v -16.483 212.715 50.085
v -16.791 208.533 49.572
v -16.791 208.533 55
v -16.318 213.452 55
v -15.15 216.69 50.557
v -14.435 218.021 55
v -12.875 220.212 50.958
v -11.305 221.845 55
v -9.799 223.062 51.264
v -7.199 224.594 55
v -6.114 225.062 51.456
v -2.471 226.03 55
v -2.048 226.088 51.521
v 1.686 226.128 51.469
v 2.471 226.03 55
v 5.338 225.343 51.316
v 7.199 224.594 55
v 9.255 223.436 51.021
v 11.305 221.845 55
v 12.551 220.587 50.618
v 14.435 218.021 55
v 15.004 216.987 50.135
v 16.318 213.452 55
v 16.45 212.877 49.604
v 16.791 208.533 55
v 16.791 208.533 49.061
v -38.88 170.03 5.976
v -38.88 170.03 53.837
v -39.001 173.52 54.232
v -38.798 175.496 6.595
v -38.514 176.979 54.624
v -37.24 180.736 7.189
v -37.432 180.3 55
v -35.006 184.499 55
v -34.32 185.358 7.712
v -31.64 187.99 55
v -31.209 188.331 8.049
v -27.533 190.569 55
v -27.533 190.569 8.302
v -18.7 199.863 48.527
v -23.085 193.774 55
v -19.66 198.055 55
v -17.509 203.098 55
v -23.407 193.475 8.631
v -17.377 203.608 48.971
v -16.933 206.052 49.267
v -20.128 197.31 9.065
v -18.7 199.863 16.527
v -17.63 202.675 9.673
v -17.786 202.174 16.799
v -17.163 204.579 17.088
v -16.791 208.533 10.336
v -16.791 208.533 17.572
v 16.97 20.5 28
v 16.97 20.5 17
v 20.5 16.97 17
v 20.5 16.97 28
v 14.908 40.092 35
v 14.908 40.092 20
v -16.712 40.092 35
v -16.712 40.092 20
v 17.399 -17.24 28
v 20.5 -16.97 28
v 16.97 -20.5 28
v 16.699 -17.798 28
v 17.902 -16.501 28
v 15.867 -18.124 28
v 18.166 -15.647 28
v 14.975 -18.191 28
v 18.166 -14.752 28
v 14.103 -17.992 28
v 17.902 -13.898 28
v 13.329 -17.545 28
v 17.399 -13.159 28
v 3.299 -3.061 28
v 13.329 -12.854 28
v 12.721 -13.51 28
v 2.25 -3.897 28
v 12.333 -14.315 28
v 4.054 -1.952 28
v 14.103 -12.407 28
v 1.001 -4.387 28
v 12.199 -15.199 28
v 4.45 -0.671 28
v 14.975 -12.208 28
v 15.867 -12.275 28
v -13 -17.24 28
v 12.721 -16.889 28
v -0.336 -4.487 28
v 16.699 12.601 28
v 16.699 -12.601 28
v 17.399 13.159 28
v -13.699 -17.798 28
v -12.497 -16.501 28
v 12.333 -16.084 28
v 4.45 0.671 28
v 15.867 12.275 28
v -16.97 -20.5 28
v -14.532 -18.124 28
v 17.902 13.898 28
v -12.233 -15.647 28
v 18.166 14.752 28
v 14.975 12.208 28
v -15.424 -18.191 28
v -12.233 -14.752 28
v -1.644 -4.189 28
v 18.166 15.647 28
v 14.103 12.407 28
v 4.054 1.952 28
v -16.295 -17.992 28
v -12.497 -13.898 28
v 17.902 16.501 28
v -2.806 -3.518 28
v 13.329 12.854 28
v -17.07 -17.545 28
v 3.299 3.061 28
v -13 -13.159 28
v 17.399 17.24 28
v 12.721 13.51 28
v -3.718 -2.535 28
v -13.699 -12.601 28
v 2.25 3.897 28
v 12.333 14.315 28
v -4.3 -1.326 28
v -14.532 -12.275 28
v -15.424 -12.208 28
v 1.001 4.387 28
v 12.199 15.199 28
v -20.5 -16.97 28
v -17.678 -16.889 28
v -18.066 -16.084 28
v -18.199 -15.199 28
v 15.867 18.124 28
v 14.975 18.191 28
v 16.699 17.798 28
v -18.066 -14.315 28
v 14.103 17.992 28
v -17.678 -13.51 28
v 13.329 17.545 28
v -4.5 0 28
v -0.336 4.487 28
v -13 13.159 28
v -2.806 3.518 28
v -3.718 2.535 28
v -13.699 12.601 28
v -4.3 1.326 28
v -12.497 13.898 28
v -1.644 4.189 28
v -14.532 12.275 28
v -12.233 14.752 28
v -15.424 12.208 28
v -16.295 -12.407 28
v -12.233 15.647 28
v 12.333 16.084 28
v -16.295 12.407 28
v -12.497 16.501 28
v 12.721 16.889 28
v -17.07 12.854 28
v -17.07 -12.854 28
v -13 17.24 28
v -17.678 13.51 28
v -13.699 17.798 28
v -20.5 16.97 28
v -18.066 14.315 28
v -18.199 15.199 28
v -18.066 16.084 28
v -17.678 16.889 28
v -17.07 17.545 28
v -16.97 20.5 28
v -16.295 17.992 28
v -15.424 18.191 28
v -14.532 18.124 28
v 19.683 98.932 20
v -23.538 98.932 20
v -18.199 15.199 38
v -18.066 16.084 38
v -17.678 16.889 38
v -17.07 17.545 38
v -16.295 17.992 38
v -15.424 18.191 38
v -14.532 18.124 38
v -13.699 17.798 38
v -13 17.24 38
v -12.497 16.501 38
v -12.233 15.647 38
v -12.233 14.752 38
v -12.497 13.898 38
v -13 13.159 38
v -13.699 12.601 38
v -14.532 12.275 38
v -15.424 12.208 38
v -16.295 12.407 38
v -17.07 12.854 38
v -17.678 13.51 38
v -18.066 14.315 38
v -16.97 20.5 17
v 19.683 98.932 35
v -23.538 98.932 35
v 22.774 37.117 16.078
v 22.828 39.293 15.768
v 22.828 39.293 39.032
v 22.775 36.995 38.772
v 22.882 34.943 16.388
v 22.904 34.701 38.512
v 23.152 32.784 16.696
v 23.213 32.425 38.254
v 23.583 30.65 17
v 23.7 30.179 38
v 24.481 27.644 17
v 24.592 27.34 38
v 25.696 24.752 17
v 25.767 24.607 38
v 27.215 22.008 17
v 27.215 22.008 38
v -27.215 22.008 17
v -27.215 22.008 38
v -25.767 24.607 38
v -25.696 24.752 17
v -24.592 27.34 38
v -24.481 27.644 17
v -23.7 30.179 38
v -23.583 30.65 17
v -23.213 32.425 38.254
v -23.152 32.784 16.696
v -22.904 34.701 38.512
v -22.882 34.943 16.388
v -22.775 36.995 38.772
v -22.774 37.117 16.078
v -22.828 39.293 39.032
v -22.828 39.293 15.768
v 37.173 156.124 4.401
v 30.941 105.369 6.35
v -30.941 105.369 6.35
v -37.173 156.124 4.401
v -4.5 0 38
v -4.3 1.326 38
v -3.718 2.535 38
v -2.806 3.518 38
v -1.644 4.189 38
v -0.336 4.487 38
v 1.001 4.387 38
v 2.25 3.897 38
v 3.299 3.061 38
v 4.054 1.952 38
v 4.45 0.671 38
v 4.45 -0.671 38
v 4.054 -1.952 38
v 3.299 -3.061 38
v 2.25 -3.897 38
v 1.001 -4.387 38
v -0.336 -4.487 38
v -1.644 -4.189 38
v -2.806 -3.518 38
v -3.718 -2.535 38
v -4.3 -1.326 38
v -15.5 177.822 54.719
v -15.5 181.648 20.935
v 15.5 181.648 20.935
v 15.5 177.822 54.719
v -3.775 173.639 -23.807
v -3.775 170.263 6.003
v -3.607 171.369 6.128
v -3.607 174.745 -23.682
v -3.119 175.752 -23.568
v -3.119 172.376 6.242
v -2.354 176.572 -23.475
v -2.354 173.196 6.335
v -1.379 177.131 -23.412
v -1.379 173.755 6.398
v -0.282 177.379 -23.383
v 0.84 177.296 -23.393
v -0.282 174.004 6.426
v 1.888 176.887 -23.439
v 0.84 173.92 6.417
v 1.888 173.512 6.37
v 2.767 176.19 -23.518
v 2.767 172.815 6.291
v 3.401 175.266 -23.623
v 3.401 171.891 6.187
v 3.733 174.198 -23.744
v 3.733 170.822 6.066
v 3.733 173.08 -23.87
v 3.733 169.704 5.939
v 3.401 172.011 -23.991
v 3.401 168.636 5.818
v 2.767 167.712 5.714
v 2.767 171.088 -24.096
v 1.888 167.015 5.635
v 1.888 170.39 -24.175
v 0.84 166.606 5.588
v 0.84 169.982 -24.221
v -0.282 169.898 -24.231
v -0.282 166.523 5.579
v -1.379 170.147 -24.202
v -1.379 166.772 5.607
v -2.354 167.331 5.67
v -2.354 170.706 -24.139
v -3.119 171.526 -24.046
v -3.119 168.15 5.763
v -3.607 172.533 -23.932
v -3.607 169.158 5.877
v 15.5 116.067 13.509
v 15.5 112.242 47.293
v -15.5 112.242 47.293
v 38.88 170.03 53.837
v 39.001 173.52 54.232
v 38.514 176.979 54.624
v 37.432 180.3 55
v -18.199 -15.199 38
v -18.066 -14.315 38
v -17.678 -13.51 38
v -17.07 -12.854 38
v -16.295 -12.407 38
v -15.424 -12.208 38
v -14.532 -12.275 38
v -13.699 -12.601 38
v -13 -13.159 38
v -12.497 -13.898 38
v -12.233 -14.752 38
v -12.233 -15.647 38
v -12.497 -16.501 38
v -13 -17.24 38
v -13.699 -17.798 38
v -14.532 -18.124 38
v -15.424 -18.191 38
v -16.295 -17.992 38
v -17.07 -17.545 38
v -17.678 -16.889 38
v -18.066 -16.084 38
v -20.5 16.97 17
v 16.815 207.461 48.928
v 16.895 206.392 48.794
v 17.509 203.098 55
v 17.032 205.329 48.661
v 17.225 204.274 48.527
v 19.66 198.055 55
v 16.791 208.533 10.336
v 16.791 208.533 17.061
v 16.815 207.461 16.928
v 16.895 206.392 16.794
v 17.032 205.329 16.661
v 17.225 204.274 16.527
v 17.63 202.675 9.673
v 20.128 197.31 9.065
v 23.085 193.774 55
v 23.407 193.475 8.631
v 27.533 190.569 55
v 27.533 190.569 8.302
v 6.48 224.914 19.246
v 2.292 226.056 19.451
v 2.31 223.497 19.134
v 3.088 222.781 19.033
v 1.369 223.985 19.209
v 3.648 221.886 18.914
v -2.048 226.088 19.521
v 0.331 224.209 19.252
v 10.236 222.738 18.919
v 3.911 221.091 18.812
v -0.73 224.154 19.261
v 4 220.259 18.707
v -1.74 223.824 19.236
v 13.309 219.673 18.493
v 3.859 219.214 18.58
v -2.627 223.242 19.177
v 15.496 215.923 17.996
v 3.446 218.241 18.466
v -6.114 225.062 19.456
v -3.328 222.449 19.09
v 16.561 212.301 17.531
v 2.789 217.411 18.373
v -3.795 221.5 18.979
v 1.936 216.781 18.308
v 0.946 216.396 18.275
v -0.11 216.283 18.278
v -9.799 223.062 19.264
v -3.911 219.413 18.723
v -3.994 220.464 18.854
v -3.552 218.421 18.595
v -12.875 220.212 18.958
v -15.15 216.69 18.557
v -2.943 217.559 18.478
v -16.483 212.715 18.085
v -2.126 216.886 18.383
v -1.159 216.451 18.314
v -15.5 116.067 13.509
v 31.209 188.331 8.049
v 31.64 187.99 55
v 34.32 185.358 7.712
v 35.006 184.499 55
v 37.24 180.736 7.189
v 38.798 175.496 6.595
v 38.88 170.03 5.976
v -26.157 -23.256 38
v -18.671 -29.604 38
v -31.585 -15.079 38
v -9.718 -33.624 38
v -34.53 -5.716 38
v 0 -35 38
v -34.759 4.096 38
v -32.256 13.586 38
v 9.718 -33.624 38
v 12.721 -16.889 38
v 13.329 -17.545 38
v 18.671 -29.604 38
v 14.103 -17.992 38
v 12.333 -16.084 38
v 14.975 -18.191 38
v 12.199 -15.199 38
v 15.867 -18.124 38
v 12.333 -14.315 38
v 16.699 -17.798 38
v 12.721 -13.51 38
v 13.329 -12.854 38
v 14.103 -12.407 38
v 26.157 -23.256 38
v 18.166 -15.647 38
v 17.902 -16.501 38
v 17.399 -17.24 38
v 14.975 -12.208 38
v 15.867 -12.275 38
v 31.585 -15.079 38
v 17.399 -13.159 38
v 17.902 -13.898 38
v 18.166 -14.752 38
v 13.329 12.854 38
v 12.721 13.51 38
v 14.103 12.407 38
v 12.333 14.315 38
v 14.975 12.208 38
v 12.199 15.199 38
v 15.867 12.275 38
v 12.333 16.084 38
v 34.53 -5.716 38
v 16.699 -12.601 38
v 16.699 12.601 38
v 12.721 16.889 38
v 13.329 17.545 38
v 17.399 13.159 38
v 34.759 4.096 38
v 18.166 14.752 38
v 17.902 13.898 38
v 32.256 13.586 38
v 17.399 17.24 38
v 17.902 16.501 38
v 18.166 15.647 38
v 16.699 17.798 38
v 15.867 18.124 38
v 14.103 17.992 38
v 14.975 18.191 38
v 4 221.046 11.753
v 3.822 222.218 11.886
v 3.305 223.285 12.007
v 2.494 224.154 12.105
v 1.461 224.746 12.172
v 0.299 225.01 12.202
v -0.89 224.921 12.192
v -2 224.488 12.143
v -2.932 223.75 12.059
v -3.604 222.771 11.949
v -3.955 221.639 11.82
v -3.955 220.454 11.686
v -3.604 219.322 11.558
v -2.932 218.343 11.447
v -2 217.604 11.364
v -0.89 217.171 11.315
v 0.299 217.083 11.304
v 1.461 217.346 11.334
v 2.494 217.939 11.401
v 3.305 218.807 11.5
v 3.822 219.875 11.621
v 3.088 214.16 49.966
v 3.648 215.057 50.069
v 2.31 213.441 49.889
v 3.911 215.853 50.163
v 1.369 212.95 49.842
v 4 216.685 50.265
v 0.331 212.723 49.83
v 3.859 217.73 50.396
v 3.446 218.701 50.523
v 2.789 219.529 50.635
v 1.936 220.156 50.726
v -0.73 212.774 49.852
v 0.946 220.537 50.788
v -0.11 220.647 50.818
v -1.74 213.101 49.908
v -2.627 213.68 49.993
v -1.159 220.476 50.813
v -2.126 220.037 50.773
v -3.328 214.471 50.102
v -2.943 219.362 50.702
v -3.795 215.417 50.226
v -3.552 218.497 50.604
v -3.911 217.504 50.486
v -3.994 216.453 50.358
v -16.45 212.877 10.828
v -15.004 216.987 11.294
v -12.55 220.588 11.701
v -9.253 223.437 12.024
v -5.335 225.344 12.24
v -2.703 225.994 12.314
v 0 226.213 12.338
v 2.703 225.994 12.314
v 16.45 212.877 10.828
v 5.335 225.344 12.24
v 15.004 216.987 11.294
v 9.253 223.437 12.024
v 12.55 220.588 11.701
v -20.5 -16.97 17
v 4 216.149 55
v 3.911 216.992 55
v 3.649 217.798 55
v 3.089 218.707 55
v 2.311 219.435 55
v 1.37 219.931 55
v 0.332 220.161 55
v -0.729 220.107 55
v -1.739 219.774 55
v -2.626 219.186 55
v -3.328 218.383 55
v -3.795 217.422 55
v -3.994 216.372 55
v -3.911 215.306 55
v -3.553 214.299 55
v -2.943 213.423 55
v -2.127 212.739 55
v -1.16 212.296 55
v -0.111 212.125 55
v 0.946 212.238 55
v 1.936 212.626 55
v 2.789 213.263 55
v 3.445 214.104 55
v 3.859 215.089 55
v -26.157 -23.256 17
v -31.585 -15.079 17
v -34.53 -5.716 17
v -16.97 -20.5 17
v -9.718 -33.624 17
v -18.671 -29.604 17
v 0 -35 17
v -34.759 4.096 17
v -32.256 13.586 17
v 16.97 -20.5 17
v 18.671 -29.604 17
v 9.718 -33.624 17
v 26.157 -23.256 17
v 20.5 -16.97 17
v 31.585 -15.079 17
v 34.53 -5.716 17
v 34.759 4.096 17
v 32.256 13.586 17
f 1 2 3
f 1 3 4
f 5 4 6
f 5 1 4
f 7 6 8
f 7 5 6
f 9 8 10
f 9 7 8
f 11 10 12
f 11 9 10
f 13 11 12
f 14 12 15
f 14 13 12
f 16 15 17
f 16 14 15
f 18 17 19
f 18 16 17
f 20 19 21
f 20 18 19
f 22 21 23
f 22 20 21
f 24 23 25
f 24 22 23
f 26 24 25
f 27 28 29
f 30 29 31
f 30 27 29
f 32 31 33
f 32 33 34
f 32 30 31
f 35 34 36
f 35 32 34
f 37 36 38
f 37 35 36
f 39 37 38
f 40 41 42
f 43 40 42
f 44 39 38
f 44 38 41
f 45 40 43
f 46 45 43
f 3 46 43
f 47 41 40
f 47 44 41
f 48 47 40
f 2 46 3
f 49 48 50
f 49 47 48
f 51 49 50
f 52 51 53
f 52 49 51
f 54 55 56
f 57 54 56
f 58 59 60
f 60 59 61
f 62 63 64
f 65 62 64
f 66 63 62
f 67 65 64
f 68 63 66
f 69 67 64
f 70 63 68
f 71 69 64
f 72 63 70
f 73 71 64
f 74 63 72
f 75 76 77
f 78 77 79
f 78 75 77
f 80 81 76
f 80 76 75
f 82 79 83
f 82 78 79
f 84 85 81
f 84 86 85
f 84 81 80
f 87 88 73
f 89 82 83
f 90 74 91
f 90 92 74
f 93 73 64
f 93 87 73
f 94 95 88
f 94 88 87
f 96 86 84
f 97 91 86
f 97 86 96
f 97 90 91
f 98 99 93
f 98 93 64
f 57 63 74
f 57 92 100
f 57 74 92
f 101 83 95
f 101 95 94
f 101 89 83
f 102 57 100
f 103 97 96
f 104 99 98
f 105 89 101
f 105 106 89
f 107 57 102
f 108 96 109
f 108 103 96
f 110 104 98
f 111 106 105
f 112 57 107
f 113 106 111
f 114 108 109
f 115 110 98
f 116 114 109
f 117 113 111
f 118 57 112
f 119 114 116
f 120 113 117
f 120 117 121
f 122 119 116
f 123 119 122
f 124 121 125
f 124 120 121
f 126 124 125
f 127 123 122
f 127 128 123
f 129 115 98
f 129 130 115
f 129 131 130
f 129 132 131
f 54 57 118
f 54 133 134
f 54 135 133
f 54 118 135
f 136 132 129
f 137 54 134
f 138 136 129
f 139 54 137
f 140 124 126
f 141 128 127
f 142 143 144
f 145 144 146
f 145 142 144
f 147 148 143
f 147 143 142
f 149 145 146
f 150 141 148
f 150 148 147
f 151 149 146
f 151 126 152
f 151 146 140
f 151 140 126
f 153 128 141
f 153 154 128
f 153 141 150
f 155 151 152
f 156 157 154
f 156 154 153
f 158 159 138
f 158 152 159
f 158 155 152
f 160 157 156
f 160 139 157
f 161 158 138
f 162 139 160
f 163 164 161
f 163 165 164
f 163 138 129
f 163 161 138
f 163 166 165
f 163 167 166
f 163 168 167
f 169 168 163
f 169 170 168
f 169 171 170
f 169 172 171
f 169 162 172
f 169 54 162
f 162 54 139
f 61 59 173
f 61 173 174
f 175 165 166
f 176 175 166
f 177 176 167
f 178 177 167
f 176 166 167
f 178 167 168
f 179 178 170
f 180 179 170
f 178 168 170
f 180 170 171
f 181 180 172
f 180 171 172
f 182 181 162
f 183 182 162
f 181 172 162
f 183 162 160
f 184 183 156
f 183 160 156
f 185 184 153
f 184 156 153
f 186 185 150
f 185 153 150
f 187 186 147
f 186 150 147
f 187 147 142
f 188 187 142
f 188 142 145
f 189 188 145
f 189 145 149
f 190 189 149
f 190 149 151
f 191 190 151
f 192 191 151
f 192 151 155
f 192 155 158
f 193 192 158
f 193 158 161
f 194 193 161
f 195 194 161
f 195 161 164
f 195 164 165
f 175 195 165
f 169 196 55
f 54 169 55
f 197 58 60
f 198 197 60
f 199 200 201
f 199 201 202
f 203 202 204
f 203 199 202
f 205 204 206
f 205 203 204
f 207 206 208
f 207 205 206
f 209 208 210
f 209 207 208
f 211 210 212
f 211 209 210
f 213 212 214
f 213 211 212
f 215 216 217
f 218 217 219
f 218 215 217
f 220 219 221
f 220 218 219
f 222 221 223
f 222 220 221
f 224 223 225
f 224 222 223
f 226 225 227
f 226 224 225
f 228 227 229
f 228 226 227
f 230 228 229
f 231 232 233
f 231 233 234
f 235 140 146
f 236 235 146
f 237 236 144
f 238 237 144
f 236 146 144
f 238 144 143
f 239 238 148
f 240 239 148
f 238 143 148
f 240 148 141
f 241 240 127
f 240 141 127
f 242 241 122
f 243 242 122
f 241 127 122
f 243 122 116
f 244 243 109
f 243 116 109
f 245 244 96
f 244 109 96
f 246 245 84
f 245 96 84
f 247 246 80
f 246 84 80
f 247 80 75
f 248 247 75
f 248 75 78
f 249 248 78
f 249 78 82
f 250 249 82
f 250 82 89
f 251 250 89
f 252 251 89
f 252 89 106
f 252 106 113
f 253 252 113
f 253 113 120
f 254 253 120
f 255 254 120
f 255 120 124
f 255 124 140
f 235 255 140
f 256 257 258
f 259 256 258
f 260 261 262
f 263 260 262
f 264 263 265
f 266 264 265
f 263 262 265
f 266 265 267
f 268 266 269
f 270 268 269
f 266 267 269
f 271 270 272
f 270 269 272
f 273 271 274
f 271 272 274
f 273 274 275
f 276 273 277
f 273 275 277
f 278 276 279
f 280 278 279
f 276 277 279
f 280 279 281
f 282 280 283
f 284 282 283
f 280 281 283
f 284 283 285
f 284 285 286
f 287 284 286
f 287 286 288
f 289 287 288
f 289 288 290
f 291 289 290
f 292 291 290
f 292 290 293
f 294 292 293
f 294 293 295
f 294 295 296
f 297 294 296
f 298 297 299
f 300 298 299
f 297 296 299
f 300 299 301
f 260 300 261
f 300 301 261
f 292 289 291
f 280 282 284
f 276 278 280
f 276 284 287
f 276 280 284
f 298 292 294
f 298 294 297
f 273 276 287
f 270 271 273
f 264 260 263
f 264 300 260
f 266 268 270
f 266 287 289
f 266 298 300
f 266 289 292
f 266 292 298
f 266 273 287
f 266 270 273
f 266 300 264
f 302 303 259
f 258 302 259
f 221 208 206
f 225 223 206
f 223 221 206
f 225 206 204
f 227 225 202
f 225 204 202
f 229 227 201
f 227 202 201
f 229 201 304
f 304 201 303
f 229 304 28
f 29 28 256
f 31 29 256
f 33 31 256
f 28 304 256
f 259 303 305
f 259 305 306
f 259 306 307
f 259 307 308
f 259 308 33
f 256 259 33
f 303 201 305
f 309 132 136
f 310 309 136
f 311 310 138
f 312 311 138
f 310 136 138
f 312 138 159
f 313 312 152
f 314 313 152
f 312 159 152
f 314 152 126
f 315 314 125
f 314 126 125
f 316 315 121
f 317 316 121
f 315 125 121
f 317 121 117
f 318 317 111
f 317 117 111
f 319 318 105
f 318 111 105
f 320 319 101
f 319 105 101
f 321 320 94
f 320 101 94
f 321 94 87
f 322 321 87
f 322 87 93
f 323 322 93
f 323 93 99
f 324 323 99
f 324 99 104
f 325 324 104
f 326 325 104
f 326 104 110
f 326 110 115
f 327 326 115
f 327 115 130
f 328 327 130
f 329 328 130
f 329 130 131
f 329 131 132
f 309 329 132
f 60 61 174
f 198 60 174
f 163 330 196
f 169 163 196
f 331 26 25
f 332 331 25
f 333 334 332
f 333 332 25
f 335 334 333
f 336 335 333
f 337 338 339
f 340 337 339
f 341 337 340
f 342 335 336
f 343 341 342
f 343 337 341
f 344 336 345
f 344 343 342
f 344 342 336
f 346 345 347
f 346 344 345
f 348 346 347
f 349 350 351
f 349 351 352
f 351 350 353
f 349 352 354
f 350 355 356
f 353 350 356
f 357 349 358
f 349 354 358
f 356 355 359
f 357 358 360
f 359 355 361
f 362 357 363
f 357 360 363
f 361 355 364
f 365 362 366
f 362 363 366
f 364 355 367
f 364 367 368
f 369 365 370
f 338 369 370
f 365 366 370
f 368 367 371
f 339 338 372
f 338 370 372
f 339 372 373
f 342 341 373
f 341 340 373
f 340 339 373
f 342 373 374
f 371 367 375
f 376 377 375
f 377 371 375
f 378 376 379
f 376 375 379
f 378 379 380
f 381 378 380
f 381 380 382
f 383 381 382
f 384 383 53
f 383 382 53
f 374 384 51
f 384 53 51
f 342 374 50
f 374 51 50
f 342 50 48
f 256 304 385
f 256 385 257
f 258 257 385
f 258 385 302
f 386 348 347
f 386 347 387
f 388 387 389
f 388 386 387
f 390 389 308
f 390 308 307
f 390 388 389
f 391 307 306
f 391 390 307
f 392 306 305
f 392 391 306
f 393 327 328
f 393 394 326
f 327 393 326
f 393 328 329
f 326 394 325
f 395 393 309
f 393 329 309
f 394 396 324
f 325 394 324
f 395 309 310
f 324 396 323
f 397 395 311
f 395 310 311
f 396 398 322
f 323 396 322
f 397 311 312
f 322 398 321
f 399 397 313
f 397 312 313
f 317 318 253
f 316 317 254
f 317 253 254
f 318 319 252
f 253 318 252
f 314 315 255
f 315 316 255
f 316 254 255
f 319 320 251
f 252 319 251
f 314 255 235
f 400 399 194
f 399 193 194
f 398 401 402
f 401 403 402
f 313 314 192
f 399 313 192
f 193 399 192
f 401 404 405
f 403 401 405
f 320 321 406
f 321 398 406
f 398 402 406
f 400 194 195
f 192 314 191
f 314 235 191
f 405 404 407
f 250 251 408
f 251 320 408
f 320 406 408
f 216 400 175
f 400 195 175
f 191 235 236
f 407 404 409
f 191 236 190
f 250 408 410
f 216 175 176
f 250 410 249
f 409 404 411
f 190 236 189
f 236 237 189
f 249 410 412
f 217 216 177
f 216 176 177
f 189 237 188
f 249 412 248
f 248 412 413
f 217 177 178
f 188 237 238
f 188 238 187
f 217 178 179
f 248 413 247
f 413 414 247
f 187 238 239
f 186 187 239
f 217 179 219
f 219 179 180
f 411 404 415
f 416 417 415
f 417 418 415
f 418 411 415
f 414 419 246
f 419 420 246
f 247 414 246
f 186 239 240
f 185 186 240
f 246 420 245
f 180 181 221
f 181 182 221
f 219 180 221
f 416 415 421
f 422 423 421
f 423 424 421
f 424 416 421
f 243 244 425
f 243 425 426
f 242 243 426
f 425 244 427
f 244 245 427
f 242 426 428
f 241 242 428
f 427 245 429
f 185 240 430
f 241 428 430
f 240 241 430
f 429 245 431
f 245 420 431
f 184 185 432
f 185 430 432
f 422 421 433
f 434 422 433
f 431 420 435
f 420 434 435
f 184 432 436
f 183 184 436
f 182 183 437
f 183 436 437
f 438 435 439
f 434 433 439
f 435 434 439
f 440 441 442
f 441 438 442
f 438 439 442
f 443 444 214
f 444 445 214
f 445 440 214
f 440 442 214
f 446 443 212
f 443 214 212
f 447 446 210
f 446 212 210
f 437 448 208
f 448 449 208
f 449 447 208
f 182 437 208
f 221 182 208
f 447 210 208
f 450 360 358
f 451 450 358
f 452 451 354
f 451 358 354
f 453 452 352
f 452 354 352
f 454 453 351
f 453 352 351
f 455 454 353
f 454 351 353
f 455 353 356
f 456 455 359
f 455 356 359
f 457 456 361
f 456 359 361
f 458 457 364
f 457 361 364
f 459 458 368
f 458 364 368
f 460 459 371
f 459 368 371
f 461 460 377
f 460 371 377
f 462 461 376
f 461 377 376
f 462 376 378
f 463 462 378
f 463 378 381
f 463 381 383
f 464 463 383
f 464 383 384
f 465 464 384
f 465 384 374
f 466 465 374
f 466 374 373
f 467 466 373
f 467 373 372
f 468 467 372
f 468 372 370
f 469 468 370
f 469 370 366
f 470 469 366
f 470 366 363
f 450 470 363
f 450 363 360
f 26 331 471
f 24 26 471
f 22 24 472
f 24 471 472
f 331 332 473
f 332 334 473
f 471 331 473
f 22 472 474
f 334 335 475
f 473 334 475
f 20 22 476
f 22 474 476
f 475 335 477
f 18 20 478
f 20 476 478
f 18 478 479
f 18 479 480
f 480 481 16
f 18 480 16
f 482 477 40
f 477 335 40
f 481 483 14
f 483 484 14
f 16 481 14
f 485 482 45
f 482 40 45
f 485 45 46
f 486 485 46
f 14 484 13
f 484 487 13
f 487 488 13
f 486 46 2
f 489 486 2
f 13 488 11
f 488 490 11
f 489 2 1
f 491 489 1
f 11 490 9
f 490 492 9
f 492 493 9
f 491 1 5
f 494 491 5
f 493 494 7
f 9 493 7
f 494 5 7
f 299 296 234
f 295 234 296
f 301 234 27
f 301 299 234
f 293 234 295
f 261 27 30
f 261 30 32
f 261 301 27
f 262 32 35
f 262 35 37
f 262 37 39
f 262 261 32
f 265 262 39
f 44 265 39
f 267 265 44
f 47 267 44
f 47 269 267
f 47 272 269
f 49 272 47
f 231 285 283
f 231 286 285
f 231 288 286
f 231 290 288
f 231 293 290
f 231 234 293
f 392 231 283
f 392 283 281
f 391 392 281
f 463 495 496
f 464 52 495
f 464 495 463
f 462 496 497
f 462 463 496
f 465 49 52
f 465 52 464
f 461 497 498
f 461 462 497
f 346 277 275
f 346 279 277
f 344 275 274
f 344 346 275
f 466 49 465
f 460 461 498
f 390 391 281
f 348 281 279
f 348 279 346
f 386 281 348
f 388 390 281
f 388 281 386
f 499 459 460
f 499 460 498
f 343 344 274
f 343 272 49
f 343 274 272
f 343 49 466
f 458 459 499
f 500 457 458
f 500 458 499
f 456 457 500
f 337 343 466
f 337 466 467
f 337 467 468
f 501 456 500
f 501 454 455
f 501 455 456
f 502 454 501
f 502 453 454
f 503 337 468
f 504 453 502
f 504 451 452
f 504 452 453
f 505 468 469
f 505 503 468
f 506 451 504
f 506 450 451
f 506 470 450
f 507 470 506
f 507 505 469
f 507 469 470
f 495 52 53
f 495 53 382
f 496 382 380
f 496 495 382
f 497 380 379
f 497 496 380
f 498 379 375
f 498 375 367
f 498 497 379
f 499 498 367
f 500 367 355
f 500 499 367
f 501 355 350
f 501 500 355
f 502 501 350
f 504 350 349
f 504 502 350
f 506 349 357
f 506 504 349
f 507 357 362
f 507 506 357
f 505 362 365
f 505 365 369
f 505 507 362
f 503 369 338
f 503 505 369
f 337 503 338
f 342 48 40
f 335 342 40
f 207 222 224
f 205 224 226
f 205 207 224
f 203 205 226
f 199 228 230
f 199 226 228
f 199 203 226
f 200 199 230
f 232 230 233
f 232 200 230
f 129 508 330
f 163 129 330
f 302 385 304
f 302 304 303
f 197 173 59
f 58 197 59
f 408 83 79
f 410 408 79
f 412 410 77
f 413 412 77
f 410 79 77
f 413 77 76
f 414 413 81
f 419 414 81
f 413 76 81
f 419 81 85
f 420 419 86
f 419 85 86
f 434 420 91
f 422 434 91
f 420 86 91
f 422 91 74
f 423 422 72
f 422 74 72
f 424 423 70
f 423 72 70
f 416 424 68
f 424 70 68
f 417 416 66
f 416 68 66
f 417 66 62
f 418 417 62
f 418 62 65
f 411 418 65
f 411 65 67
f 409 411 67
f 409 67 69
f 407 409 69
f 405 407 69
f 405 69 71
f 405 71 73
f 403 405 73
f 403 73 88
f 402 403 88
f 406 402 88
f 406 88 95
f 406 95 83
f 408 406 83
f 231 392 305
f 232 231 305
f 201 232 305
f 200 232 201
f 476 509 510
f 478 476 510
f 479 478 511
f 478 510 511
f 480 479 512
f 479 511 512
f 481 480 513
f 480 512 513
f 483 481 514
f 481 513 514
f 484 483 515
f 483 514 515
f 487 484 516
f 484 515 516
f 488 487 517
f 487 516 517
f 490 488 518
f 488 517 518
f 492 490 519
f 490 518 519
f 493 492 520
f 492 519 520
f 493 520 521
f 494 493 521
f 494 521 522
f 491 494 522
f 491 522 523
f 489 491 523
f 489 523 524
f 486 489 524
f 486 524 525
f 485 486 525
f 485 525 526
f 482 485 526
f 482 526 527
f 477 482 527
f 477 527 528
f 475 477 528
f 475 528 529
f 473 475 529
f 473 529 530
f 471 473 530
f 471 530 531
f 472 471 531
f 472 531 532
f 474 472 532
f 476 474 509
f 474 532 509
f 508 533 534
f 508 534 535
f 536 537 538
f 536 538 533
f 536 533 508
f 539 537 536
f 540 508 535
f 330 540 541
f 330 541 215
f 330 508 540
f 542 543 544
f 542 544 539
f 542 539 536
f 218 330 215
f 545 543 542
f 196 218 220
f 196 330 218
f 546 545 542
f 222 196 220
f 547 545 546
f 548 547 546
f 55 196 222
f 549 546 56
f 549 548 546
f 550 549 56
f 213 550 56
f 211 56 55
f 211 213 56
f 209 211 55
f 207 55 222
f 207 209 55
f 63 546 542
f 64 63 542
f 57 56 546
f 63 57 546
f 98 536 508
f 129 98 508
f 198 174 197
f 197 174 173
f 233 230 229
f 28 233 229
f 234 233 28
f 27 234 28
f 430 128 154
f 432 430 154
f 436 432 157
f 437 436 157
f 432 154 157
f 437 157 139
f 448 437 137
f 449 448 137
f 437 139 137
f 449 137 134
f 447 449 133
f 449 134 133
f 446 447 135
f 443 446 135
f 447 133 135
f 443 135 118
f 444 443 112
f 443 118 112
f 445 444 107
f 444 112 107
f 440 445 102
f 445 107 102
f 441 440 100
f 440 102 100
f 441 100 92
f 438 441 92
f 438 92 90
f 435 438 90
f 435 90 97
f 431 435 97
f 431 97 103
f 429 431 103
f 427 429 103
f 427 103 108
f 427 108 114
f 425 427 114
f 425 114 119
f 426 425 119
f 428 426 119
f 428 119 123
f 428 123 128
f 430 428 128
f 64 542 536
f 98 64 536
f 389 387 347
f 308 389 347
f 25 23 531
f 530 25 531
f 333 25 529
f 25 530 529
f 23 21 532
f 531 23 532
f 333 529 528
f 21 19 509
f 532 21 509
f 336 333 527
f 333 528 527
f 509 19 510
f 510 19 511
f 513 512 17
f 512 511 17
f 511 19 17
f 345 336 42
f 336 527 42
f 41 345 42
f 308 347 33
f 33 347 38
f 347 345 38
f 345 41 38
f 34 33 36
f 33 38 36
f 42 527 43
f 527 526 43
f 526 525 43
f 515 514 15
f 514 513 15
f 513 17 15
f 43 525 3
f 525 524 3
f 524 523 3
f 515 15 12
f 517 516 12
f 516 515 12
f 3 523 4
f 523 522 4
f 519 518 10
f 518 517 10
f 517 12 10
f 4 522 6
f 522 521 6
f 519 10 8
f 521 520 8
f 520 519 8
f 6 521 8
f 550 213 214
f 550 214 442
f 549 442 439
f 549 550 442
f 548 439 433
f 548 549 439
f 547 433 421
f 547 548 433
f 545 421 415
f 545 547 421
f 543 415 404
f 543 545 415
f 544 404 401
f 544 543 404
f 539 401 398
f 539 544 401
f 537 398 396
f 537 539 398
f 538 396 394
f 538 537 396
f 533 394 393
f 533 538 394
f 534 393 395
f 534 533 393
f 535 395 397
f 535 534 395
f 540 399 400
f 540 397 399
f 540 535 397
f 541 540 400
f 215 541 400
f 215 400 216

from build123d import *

# Parameters (mm, degrees)
BOSS_EXTRUDE1_DEPTH     = 55
CUT_EXTRUDE3_DEPTH      = 28
CUT_EXTRUDE4_DEPTH      = 40.029131656
CUT_EXTRUDE4_DEPTH_BACK = 40.029131656
SKETCH18_R              = 4.5
SKETCH18_R_2            = 3
CUT_EXTRUDE5_DEPTH      = 24.598674983
CUT_EXTRUDE5_DEPTH_BACK = 28
CUT_EXTRUDE6_DEPTH      = 26.134831719
CUT_EXTRUDE6_DEPTH_BACK = 85.175442033
SKETCH21_R              = 4
CUT_EXTRUDE7_DEPTH      = 25.226187847
CUT_EXTRUDE7_DEPTH_BACK = 56.443633682
SKETCH22_W              = 31
SKETCH22_H              = 66
CUT_EXTRUDE8_DEPTH      = 34
SKETCH30_R              = 3.775
BOSS_EXTRUDE2_DEPTH     = 30
CUT_EXTRUDE9_START      = 20
CUT_EXTRUDE9_DEPTH      = 15


with BuildPart() as part:
    # Sketch1 → Boss-Extrude1 (new body)
    with BuildSketch(Plane.XY):
        with BuildLine():
            Line((-22.827528122, 39.292617223), (-38.880054689, 170.029954628))
            ThreePointArc((-38.880054689, 170.029954628), (-36.535345881, 182.138559801), (-27.533199801, 190.569297881))
            ThreePointArc((-27.533199801, 190.569297881), (-19.660174006, 198.055084384), (-16.79086128, 208.533088928))
            ThreePointArc((-16.79086128, 208.533088928), (0, 226.212902341), (16.79086128, 208.533088928))
            ThreePointArc((16.79086128, 208.533088928), (19.660174006, 198.055084384), (27.533199801, 190.569297881))
            ThreePointArc((27.533199801, 190.569297881), (36.535345881, 182.138559801), (38.880054689, 170.029954628))
            Line((38.880054689, 170.029954628), (22.827528122, 39.292617223))
            ThreePointArc((22.827528122, 39.292617223), (23.667809595, 30.306601974), (27.215074691, 22.007719318))
            ThreePointArc((27.215074691, 22.007719318), (0, -35), (-27.215074691, 22.007719318))
            ThreePointArc((-27.215074691, 22.007719318), (-23.667809595, 30.306601974), (-22.827528122, 39.292617223))
        make_face()
    extrude(amount=BOSS_EXTRUDE1_DEPTH)

    # Sketch5 → Cut-Extrude3 (cut)
    with BuildSketch(Plane.XY):
        Polygon((16.97, -20.5), (-16.97, -20.5), (-20.5, -16.97), (-20.5, 16.97), (-16.97, 20.5), (16.97, 20.5), (20.5, 16.97), (20.5, -16.97), align=None)
    extrude(amount=CUT_EXTRUDE3_DEPTH, mode=Mode.SUBTRACT)

    # Sketch15 → Cut-Extrude4 (cut, two sides)
    with BuildSketch(Plane(origin=(0, 0, 0), x_dir=(0, 0, -1), z_dir=(1, 0, 0))) as cut_extrude4_sk:
        Polygon((-38, -35), (-38, 30.17907071), (-55, 180.299626254), (-55, -35), align=None)
        Polygon((-4.401325017, 156.123614829), (-12.400064416, 226.757450259), (0, 226.212902341), (0, 149.914783233), (0, 117.257182084), (0, -35), (-17, -35), (-17, 30.65016827), (-6.349536626, 105.369192589), align=None)
    extrude(amount=CUT_EXTRUDE4_DEPTH, mode=Mode.SUBTRACT)
    extrude(cut_extrude4_sk.sketch, amount=-CUT_EXTRUDE4_DEPTH_BACK, mode=Mode.SUBTRACT)

    # Sketch18 → Cut-Extrude5 (cut, two sides)
    with BuildSketch(Plane(origin=(0, 0, 28), x_dir=(-1, 0, 0), z_dir=(0, 0, -1))) as cut_extrude5_sk:
        Circle(SKETCH18_R)
        with Locations((-15.199466094, 15.199466094)):
            Circle(SKETCH18_R_2)
        with Locations((15.199466094, 15.199466094)):
            Circle(SKETCH18_R_2)
        with Locations((15.199466094, -15.199466094)):
            Circle(SKETCH18_R_2)
        with Locations((-15.199466094, -15.199466094)):
            Circle(SKETCH18_R_2)
    extrude(amount=CUT_EXTRUDE5_DEPTH, mode=Mode.SUBTRACT)
    extrude(cut_extrude5_sk.sketch, amount=-CUT_EXTRUDE5_DEPTH_BACK, mode=Mode.SUBTRACT)

    # Sketch20 → Cut-Extrude6 (cut, two sides)
    with BuildSketch(Plane(origin=(-17.735618329, -2.177660109, 0), x_dir=(0, 0, 1), z_dir=(-0.992546152, -0.121869343, 0))) as cut_extrude6_sk:
        Polygon((16.527188649, 200.652068787), (48.527188649, 200.652068787), (51.520800543, 224.652068787), (19.520800543, 224.652068787), align=None)
    extrude(amount=CUT_EXTRUDE6_DEPTH, mode=Mode.SUBTRACT)
    extrude(cut_extrude6_sk.sketch, amount=-CUT_EXTRUDE6_DEPTH_BACK, mode=Mode.SUBTRACT)

    # Sketch21 → Cut-Extrude7 (cut, two sides)
    with BuildSketch(Plane(origin=(0, -3.866612347, 34.144587862), x_dir=(1, 0, 0), z_dir=(0, -0.11252313, 0.993649106))) as cut_extrude7_sk:
        with Locations((0, 220.965020256)):
            Circle(SKETCH21_R)
    extrude(amount=CUT_EXTRUDE7_DEPTH, mode=Mode.SUBTRACT)
    extrude(cut_extrude7_sk.sketch, amount=-CUT_EXTRUDE7_DEPTH_BACK, mode=Mode.SUBTRACT)

    # Sketch22 → Cut-Extrude8 (cut)
    with BuildSketch(Plane(origin=(0, -3.866612347, 34.144587862), x_dir=(1, 0, 0), z_dir=(0, -0.11252313, 0.993649106))):
        with Locations((0, 149.850276465)):
            Rectangle(SKETCH22_W, SKETCH22_H)
    extrude(amount=-CUT_EXTRUDE8_DEPTH, mode=Mode.SUBTRACT)

    # Sketch30 → Boss-Extrude2 (add)
    with BuildSketch(Plane(origin=(0, 1.484646511, -13.110350529), x_dir=(-1, 0, 0), z_dir=(0, 0.11252313, -0.993649106))):
        with Locations((0, 169.857341116)):
            Circle(SKETCH30_R)
    extrude(amount=BOSS_EXTRUDE2_DEPTH)

    # Sketch31 → Cut-Extrude9 (cut)
    with BuildSketch(Plane.XY.offset(CUT_EXTRUDE9_START)):
        Polygon((-16.71237329, 40.092398344), (-23.538465204, 98.932300939), (19.683150051, 98.932300939), (14.908186254, 40.092398344), align=None)
    extrude(amount=CUT_EXTRUDE9_DEPTH, mode=Mode.SUBTRACT)


solid = part.part
